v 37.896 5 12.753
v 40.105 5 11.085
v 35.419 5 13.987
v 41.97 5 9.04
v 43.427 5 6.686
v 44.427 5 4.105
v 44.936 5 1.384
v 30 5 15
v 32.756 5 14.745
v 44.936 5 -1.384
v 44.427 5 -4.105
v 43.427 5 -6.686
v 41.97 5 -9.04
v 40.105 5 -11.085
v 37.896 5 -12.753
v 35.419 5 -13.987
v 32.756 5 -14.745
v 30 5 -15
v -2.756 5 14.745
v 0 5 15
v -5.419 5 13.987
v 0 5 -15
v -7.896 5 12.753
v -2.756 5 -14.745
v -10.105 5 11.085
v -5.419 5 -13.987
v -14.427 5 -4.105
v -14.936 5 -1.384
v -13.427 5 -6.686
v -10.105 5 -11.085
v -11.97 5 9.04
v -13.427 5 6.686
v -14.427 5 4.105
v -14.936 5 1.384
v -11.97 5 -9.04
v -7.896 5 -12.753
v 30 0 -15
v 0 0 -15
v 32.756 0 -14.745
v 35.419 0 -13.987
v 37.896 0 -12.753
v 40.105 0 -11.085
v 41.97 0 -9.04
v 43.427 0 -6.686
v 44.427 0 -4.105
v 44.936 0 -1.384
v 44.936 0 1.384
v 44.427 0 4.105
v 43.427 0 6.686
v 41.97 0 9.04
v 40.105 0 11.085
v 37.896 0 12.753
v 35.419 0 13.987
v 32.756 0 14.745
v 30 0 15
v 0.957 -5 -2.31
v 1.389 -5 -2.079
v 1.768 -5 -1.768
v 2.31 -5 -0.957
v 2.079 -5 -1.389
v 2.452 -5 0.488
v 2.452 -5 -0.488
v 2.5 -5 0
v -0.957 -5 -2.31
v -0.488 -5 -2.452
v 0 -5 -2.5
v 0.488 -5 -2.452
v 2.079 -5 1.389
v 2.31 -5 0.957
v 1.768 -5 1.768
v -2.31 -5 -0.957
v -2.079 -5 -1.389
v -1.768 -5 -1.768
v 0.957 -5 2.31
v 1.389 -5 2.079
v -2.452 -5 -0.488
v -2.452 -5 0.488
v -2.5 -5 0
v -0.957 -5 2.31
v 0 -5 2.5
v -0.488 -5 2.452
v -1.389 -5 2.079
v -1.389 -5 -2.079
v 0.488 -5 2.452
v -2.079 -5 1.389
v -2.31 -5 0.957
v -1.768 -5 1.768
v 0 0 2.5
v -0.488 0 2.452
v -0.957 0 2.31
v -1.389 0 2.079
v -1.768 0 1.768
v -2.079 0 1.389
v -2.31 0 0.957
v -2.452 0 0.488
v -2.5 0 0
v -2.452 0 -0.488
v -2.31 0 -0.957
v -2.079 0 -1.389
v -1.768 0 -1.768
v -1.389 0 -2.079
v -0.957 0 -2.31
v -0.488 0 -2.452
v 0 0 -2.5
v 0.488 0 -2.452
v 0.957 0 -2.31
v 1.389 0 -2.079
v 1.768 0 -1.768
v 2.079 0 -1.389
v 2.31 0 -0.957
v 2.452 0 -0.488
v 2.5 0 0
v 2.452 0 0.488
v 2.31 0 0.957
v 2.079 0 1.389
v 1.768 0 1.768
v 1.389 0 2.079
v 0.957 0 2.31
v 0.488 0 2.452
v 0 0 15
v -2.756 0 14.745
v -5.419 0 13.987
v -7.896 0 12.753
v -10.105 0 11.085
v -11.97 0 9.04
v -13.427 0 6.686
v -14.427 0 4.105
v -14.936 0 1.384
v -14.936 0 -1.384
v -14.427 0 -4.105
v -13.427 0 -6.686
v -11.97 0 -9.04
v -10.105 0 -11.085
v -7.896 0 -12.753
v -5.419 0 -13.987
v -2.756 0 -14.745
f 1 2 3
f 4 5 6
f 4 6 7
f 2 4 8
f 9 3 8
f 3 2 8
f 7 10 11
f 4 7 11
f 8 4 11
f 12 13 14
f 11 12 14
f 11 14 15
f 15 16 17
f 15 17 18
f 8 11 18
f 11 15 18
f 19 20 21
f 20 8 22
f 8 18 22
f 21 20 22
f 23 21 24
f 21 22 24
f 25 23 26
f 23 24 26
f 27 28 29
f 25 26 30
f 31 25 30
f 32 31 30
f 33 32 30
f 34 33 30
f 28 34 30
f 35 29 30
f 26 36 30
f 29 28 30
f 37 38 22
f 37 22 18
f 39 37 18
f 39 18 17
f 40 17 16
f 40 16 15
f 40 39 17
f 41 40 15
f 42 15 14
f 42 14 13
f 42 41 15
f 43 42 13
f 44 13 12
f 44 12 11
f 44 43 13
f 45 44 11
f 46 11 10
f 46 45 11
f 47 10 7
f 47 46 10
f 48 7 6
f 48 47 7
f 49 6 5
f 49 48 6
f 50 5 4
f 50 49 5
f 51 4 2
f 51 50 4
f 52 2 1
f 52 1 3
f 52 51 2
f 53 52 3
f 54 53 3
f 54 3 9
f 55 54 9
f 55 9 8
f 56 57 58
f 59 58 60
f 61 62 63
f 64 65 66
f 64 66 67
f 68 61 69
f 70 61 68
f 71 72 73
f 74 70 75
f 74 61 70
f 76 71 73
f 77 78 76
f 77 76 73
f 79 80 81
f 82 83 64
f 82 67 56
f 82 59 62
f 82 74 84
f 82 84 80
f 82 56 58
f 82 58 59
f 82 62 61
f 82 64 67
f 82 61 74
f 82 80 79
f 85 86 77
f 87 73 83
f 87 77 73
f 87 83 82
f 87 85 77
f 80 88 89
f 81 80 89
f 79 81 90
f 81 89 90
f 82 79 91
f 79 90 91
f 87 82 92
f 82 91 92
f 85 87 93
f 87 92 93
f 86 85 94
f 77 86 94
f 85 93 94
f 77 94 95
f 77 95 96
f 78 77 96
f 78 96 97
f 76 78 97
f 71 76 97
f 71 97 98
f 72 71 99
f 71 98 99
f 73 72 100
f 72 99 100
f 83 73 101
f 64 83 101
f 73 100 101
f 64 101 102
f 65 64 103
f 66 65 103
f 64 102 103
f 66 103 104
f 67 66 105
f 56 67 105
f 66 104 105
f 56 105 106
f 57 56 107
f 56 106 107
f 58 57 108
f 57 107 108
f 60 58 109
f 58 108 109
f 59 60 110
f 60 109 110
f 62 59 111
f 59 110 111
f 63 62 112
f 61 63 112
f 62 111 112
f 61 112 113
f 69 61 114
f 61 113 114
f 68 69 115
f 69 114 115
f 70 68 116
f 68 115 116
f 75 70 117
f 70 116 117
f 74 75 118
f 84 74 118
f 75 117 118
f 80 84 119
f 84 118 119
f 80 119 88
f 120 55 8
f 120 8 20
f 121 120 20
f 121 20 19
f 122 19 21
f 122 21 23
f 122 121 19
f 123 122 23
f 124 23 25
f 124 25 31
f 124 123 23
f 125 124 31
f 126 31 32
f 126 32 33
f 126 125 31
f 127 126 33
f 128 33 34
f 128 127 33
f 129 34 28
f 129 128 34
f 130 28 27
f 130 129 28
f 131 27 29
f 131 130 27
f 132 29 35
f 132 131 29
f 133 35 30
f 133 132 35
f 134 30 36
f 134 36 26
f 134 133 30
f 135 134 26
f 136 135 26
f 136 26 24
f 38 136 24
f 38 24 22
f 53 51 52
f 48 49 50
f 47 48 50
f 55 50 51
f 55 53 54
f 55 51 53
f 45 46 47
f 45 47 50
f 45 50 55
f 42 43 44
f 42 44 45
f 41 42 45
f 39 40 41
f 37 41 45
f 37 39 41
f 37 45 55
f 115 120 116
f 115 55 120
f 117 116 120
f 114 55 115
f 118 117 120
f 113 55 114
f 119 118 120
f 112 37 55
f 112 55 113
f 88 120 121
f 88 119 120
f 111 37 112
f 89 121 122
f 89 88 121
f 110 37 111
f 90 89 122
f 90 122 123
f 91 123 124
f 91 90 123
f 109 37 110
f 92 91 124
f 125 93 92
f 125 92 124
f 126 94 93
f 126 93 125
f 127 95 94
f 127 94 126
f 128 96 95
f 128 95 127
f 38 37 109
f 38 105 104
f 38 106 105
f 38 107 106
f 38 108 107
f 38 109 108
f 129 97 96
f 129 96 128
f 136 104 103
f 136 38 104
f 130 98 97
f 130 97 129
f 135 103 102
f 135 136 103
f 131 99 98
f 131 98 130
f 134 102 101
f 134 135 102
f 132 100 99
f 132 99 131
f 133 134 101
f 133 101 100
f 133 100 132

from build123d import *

# Parameters (mm, degrees)
EXTRUDE_1_DEPTH = 5
SKETCH_2_R      = 2.5
EXTRUDE_2_DEPTH = 5


with BuildPart() as part:
    # 草图1 → 凸台-拉伸1 (new body)
    with BuildSketch(Plane(origin=(0, 0, 0), x_dir=(1, 0, 0), z_dir=(0, 1, 0))):
        with BuildLine():
            Line((0, 15), (30, 15))
            ThreePointArc((30, 15), (45, 0), (30, -15))
            Line((30, -15), (0, -15))
            ThreePointArc((0, -15), (-15, 0), (0, 15))
        make_face()
    extrude(amount=EXTRUDE_1_DEPTH)

    # 草图2 → 凸台-拉伸2 (add)
    with BuildSketch(Plane.XZ):
        with Locations(Location((0, 0, 0), (0, 0, 90))):
            Circle(SKETCH_2_R)
    extrude(amount=EXTRUDE_2_DEPTH)


solid = part.part
